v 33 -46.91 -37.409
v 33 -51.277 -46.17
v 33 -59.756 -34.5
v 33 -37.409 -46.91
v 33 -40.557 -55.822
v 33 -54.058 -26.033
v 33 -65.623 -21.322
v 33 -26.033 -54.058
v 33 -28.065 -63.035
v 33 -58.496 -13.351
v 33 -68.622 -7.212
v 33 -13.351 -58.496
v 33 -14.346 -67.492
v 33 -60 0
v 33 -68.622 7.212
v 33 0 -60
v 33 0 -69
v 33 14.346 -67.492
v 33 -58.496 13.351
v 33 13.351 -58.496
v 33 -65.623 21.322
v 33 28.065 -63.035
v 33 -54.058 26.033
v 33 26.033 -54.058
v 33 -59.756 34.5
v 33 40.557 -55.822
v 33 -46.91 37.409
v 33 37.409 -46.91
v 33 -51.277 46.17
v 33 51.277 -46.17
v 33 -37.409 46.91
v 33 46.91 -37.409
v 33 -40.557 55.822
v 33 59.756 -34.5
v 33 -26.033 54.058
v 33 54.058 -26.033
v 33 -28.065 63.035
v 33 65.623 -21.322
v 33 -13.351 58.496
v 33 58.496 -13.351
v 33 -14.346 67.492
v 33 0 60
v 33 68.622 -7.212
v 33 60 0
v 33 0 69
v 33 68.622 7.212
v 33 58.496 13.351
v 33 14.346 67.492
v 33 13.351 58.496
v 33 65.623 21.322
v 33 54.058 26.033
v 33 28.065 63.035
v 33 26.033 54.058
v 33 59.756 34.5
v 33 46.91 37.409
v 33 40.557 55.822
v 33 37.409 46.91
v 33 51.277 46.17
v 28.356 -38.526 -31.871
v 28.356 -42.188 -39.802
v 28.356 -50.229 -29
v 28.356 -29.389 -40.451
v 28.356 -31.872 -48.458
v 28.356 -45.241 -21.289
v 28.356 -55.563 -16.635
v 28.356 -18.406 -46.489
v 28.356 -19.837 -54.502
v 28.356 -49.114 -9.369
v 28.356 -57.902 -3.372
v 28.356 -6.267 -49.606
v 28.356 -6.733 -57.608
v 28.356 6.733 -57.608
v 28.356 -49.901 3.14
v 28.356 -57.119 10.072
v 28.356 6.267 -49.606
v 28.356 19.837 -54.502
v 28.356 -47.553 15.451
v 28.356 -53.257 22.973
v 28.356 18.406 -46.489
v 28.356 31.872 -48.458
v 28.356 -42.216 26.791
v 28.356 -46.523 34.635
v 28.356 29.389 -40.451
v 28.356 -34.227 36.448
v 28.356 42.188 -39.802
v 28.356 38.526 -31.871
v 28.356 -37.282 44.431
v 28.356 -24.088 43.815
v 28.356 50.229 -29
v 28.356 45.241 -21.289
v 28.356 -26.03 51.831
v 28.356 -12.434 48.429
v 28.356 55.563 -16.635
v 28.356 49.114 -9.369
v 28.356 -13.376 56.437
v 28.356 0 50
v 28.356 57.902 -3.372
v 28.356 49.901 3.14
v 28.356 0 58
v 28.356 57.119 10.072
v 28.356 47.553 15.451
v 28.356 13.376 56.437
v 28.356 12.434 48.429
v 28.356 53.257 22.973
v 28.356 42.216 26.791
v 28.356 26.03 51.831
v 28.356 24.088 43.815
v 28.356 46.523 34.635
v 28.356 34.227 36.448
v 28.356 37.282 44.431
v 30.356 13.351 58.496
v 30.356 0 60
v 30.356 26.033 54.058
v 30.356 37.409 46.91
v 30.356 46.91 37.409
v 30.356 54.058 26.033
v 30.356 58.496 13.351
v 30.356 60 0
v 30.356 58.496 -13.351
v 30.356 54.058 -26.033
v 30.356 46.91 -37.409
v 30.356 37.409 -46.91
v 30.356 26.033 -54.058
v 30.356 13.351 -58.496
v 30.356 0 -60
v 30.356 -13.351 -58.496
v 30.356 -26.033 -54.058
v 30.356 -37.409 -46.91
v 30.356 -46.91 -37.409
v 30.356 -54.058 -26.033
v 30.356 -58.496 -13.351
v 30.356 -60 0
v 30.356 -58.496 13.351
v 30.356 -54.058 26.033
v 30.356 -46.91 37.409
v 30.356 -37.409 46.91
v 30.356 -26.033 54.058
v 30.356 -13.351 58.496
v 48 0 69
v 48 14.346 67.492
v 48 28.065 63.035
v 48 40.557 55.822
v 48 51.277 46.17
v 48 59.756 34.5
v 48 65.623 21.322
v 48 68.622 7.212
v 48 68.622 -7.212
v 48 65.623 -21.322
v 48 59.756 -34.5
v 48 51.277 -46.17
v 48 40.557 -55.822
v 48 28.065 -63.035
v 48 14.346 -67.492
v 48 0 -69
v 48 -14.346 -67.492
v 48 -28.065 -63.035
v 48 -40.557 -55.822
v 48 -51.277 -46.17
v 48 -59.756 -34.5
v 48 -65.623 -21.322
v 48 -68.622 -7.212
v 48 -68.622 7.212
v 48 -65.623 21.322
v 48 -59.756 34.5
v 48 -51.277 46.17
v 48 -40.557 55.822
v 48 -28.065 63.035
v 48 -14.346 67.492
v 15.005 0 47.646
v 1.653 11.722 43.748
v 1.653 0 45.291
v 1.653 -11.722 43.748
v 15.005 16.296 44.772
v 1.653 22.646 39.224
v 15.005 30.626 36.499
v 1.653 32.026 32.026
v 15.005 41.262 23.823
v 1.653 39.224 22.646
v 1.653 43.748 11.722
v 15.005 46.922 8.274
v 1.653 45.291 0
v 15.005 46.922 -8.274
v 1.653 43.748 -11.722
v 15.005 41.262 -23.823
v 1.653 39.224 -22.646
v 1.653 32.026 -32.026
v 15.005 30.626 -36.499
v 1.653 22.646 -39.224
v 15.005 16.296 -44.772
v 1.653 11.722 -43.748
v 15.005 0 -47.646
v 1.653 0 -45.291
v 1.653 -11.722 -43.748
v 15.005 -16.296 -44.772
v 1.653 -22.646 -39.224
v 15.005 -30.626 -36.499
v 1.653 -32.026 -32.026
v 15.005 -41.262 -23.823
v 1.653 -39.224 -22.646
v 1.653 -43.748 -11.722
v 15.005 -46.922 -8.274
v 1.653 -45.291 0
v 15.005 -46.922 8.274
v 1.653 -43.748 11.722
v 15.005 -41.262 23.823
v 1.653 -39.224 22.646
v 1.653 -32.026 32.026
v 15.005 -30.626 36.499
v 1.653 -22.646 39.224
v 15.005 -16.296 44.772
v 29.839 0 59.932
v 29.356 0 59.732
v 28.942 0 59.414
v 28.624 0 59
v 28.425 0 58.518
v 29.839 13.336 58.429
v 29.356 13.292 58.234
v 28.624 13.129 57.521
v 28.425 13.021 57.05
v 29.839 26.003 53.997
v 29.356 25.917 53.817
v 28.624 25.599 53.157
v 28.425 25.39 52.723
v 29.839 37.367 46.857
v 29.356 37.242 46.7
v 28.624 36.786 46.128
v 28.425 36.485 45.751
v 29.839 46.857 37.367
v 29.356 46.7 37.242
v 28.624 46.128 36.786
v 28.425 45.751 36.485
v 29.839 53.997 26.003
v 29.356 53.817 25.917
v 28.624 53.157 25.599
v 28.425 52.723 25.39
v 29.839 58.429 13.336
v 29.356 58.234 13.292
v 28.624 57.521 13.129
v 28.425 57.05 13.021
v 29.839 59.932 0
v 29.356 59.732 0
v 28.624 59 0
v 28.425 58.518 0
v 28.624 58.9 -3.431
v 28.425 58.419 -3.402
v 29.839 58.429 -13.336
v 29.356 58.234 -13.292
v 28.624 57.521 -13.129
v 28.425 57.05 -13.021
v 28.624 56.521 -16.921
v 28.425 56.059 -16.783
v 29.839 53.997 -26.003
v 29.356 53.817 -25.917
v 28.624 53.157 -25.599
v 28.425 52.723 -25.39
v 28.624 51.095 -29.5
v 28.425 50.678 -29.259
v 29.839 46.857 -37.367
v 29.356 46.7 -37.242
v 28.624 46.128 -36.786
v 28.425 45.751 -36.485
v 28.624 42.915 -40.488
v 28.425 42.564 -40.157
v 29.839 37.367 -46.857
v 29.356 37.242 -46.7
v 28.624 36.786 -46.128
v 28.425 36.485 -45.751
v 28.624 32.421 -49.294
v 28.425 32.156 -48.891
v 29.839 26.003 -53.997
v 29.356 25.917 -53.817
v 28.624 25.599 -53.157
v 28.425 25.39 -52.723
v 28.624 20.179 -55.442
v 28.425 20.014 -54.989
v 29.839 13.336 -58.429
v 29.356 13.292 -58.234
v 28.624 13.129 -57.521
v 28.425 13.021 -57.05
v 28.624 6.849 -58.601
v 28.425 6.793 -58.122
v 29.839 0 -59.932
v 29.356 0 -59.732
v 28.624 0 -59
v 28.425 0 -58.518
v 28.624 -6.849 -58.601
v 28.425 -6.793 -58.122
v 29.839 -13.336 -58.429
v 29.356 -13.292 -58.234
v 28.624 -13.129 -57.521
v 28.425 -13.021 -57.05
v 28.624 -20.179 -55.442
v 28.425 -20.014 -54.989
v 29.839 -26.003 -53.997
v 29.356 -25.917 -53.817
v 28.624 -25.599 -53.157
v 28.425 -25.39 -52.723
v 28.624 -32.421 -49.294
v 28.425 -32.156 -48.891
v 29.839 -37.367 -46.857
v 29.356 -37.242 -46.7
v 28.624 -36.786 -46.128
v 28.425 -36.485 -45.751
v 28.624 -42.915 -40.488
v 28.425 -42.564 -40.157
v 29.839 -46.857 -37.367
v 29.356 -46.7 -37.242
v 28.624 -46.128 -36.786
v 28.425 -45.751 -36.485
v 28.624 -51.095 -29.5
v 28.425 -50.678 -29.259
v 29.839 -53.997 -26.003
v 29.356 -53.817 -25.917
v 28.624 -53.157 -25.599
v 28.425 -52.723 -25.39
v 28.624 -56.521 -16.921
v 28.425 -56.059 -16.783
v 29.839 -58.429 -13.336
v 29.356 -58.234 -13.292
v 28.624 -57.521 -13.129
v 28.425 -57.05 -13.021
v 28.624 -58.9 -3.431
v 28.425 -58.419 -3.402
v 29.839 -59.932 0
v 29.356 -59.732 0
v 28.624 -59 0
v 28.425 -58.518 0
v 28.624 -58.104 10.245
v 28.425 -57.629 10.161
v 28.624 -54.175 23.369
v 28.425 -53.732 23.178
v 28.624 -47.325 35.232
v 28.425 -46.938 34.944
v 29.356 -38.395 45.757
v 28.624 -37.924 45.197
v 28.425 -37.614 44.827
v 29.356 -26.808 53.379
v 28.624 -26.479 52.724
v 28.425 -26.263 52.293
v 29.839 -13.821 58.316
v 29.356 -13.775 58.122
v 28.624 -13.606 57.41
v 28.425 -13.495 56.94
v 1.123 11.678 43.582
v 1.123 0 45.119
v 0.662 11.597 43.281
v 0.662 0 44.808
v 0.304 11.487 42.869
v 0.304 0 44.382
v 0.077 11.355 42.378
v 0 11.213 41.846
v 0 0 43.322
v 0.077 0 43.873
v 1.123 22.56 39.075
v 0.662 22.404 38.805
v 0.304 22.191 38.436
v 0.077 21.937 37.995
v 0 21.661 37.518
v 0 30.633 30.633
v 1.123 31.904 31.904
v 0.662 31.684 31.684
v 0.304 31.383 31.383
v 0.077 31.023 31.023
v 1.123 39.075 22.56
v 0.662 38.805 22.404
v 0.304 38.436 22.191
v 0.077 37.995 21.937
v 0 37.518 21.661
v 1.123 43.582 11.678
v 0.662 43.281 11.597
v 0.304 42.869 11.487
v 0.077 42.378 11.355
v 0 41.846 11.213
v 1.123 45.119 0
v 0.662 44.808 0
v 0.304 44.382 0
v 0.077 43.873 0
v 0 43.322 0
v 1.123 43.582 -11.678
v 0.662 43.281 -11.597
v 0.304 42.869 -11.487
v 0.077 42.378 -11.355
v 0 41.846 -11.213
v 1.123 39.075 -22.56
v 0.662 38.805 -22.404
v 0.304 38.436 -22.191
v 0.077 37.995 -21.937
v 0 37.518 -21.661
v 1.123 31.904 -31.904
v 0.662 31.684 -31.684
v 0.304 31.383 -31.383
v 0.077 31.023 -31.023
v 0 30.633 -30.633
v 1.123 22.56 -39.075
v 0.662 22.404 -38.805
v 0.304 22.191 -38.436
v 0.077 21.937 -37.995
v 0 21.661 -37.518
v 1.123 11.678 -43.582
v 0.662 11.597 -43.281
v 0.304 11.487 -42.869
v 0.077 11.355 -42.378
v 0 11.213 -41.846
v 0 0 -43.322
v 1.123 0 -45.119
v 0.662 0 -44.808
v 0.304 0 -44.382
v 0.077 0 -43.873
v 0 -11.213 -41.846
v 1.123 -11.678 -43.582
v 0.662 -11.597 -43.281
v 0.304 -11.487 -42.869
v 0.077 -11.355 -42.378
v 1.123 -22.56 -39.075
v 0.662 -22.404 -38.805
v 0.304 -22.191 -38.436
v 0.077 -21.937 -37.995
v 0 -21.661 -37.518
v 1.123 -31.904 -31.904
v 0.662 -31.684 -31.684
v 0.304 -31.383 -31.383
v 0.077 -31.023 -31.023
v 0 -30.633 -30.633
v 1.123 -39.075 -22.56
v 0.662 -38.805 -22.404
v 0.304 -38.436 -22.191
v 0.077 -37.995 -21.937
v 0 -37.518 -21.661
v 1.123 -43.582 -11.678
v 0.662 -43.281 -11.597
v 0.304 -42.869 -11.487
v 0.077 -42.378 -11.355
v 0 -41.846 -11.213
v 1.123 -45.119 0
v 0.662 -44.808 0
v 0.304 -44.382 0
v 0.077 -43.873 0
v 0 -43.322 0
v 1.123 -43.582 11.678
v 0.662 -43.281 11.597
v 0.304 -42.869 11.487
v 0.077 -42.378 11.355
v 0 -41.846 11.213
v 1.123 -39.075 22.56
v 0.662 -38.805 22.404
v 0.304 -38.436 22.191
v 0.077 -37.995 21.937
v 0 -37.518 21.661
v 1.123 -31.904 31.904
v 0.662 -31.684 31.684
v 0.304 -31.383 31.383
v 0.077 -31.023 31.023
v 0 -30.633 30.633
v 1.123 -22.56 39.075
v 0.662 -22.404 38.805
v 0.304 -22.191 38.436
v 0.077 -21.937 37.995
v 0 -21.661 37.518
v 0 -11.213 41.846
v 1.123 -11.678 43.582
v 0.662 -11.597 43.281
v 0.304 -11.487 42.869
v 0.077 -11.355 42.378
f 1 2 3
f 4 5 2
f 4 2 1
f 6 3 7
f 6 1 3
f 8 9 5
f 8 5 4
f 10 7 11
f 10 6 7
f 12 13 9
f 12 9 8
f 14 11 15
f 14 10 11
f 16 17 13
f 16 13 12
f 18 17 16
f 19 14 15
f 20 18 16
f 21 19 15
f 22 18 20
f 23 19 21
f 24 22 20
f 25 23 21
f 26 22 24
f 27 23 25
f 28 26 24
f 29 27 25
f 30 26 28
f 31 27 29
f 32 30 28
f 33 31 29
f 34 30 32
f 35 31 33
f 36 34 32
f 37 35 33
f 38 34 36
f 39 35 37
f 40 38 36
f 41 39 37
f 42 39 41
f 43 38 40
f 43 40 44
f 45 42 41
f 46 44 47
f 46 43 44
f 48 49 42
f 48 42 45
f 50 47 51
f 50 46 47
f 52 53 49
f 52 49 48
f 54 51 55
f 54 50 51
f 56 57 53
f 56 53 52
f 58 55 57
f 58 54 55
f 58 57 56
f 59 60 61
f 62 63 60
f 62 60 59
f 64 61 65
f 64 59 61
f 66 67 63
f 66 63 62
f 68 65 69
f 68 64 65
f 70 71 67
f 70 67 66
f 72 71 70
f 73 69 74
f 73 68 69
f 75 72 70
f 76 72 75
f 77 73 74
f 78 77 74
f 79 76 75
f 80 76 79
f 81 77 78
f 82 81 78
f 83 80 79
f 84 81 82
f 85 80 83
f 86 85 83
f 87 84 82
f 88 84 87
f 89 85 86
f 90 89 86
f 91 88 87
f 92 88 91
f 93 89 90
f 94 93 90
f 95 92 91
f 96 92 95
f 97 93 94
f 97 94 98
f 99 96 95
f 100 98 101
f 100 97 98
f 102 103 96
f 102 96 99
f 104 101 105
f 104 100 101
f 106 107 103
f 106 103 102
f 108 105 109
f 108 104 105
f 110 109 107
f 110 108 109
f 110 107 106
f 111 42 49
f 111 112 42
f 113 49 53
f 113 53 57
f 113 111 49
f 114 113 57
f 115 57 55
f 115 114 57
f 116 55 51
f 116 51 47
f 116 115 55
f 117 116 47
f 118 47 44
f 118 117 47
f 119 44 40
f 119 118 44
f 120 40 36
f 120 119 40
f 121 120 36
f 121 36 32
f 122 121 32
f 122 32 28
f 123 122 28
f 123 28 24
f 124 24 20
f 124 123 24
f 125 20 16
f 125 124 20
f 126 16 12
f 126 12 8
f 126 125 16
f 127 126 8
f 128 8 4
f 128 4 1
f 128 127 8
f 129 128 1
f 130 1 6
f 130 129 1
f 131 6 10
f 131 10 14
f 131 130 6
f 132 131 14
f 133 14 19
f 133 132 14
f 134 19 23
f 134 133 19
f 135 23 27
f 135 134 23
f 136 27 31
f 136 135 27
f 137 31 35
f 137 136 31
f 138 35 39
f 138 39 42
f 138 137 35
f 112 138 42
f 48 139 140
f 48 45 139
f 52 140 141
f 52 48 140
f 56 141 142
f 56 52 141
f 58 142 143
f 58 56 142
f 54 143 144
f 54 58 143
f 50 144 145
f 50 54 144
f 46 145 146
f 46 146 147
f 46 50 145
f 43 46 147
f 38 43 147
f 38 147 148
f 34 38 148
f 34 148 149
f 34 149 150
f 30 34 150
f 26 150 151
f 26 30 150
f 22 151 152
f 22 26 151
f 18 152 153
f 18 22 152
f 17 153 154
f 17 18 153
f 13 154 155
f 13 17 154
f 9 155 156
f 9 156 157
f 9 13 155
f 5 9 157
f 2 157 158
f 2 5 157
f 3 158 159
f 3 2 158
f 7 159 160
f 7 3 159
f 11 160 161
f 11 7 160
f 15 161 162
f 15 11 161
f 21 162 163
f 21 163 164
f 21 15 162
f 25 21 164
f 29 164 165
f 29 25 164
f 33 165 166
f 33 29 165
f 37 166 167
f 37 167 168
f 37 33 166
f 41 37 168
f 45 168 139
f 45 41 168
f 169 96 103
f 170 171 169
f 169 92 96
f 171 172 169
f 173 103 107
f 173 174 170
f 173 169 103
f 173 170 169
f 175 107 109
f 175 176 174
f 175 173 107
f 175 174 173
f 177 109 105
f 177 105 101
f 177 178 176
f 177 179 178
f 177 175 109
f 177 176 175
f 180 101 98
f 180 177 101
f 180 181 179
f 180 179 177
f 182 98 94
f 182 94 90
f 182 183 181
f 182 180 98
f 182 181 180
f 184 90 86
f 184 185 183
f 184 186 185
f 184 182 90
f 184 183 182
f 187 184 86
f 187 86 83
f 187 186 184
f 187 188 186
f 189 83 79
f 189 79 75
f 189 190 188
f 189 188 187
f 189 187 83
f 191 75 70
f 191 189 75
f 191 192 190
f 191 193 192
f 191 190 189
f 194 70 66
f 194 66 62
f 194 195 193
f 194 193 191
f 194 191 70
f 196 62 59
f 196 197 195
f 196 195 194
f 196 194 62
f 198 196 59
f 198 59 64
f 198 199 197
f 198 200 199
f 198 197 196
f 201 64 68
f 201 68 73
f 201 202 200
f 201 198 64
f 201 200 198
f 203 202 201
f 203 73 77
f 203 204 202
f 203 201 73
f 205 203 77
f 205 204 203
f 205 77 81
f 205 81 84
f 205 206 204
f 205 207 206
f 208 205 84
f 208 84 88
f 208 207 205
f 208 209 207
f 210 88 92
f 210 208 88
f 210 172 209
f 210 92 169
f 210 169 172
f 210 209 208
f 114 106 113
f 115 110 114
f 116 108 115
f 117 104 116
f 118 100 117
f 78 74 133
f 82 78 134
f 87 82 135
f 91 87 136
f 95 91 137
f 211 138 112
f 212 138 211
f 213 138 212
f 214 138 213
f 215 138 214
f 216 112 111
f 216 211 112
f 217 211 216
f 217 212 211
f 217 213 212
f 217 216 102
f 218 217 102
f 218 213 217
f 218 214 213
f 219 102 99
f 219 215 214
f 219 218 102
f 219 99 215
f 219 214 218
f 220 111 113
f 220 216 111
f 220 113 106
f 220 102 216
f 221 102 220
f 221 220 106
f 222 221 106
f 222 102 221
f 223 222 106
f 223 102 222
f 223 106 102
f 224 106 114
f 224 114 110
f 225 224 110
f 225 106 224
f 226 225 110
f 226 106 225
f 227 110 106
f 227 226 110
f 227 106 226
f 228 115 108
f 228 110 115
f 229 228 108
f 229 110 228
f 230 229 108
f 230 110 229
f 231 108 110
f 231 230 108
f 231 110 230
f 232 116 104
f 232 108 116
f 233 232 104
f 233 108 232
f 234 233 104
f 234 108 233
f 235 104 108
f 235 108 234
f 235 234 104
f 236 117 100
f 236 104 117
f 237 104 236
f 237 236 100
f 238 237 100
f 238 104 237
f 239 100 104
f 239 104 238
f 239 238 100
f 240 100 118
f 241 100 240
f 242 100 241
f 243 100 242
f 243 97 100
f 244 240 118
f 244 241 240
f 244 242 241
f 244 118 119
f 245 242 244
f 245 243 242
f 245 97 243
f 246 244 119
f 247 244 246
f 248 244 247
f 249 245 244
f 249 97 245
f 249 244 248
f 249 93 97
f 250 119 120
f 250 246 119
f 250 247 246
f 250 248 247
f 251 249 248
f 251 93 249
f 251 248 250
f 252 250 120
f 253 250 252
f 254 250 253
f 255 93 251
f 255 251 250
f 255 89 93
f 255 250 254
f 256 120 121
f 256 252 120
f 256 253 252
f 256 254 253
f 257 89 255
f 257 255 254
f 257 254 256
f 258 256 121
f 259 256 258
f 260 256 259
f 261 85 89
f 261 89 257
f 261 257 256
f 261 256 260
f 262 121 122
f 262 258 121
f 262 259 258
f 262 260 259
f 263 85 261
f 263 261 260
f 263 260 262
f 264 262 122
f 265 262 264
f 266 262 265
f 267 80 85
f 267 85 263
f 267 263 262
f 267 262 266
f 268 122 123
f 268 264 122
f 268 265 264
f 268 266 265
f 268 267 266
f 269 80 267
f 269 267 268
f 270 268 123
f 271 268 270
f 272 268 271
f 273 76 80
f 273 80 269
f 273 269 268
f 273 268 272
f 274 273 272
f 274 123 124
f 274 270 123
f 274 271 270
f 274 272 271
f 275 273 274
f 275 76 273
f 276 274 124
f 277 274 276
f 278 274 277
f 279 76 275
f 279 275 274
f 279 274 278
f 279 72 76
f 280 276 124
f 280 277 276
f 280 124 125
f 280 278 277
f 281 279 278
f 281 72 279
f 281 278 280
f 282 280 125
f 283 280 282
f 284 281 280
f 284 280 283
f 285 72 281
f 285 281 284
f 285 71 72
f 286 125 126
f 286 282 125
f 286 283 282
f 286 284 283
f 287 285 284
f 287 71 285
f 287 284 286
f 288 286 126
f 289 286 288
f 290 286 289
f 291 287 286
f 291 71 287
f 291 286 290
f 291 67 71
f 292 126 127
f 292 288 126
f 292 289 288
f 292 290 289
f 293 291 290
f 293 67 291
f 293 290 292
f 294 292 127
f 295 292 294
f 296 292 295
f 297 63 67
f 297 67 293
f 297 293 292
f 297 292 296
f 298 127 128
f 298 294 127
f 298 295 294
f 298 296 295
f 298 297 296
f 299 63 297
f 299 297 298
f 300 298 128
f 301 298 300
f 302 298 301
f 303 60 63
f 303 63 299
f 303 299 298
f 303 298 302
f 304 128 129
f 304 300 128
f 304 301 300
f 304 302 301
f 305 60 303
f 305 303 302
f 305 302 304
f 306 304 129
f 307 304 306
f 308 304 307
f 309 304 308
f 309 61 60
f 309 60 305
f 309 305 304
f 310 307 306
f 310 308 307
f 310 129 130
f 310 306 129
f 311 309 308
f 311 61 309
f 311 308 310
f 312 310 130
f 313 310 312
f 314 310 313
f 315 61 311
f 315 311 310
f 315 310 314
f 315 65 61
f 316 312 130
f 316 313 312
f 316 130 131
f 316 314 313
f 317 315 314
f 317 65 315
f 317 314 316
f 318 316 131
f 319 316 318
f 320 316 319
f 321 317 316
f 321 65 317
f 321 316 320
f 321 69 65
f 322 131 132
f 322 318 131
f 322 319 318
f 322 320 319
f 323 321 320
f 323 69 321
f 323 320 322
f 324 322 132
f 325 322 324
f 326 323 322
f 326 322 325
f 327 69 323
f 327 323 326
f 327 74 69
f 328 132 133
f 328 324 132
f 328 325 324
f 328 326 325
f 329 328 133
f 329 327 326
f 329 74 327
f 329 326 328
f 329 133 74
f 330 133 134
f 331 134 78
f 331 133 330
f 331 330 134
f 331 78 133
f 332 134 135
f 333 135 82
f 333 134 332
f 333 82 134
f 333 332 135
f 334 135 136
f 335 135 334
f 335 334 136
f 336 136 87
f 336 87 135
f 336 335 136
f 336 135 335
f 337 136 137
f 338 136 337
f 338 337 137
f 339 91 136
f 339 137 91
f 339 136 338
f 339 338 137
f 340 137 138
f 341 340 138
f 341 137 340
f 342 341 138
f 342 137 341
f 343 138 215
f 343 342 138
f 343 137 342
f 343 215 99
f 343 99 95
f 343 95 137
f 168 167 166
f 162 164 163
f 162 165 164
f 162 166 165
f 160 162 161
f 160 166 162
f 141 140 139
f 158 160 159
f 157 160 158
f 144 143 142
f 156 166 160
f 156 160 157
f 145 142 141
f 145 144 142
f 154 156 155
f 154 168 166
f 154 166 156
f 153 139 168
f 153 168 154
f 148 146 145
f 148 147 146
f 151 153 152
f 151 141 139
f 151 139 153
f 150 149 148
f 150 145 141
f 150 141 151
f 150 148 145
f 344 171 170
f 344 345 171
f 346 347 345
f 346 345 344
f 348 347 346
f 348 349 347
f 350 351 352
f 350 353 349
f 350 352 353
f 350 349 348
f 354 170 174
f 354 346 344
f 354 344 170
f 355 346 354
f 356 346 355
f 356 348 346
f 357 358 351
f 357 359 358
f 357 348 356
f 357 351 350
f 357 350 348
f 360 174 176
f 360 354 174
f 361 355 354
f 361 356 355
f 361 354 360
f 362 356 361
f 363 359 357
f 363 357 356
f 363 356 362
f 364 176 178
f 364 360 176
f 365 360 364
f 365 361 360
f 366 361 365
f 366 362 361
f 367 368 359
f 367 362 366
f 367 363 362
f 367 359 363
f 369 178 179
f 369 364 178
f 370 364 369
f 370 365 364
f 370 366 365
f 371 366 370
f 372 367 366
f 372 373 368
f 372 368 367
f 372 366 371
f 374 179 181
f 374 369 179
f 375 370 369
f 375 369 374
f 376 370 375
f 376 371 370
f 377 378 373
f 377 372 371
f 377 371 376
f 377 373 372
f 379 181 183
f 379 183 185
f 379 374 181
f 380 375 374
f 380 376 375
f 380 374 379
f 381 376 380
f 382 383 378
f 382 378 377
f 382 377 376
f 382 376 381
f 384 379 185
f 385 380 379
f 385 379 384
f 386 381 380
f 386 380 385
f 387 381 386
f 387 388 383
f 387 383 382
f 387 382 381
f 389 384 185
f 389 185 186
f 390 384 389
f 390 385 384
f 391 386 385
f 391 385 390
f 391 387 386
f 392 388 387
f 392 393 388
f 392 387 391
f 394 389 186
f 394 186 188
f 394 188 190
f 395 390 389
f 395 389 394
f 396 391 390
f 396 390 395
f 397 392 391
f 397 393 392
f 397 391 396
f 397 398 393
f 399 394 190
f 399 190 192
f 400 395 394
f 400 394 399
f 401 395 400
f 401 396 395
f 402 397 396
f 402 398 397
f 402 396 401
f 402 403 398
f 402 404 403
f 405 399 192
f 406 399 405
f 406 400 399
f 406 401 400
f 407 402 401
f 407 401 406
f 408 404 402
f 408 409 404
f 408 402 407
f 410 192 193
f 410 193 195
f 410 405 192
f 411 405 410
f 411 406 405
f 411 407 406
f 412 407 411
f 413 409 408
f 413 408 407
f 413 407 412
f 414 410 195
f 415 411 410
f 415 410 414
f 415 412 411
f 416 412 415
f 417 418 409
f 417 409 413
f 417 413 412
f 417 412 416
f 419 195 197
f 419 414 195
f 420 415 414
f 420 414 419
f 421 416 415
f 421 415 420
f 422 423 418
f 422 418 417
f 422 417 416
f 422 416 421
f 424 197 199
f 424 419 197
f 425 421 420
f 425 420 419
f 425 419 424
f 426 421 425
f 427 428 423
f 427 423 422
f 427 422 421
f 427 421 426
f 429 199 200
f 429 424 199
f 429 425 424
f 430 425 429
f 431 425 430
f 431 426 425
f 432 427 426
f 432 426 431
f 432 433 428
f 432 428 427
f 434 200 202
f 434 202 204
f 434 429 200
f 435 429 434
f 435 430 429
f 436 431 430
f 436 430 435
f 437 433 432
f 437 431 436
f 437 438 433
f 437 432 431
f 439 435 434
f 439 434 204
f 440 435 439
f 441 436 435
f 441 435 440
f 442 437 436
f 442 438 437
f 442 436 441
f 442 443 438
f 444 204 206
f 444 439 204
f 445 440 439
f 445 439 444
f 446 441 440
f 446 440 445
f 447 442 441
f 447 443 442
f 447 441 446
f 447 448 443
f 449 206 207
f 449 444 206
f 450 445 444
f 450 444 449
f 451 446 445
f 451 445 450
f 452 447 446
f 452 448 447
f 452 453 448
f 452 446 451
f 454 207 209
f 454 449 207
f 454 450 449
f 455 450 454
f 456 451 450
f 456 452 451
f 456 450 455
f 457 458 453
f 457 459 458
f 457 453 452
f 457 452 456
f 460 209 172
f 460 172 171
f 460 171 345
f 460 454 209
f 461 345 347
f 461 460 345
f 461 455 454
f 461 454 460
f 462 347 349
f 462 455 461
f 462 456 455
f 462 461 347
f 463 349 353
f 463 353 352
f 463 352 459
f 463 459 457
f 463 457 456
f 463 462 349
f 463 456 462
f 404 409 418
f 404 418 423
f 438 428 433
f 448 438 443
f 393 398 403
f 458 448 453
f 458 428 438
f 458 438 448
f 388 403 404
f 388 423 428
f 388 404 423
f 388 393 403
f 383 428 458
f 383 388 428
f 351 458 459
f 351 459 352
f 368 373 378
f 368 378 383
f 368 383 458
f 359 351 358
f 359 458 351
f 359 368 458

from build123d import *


# Not quite as in the source:
# - a feature of the source that left no trace in its solid (it failed there, or was rolled back) is left out


with BuildPart() as f1:
    # F0 (on Front) → F1 (revolve)
    with BuildSketch(Plane.XZ):
        with BuildLine():
            Line((0, 43.3218007376), (0, 0))
            Line((0, 0), (48, 0))
            Line((48, 0), (48, 69))
            Line((48, 69), (33, 69))
            Line((33, 69), (33, 60))
            Line((33, 60), (30.3564090981, 60))
            ThreePointArc((30.3564090981, 60), (28.9421955357, 59.4142135624), (28.3564090981, 58))
            Line((28.3564090981, 58), (28.3564090981, 50))
            Line((28.3564090981, 50), (1.6527036447, 45.2914162437))
            ThreePointArc((1.6527036447, 45.2914162437), (0.4679111138, 44.607375957), (0, 43.3218007376))
        make_face()
    revolve(axis=Axis((24, 0, 0), (-1, 0, 0)))


solid = f1.part
